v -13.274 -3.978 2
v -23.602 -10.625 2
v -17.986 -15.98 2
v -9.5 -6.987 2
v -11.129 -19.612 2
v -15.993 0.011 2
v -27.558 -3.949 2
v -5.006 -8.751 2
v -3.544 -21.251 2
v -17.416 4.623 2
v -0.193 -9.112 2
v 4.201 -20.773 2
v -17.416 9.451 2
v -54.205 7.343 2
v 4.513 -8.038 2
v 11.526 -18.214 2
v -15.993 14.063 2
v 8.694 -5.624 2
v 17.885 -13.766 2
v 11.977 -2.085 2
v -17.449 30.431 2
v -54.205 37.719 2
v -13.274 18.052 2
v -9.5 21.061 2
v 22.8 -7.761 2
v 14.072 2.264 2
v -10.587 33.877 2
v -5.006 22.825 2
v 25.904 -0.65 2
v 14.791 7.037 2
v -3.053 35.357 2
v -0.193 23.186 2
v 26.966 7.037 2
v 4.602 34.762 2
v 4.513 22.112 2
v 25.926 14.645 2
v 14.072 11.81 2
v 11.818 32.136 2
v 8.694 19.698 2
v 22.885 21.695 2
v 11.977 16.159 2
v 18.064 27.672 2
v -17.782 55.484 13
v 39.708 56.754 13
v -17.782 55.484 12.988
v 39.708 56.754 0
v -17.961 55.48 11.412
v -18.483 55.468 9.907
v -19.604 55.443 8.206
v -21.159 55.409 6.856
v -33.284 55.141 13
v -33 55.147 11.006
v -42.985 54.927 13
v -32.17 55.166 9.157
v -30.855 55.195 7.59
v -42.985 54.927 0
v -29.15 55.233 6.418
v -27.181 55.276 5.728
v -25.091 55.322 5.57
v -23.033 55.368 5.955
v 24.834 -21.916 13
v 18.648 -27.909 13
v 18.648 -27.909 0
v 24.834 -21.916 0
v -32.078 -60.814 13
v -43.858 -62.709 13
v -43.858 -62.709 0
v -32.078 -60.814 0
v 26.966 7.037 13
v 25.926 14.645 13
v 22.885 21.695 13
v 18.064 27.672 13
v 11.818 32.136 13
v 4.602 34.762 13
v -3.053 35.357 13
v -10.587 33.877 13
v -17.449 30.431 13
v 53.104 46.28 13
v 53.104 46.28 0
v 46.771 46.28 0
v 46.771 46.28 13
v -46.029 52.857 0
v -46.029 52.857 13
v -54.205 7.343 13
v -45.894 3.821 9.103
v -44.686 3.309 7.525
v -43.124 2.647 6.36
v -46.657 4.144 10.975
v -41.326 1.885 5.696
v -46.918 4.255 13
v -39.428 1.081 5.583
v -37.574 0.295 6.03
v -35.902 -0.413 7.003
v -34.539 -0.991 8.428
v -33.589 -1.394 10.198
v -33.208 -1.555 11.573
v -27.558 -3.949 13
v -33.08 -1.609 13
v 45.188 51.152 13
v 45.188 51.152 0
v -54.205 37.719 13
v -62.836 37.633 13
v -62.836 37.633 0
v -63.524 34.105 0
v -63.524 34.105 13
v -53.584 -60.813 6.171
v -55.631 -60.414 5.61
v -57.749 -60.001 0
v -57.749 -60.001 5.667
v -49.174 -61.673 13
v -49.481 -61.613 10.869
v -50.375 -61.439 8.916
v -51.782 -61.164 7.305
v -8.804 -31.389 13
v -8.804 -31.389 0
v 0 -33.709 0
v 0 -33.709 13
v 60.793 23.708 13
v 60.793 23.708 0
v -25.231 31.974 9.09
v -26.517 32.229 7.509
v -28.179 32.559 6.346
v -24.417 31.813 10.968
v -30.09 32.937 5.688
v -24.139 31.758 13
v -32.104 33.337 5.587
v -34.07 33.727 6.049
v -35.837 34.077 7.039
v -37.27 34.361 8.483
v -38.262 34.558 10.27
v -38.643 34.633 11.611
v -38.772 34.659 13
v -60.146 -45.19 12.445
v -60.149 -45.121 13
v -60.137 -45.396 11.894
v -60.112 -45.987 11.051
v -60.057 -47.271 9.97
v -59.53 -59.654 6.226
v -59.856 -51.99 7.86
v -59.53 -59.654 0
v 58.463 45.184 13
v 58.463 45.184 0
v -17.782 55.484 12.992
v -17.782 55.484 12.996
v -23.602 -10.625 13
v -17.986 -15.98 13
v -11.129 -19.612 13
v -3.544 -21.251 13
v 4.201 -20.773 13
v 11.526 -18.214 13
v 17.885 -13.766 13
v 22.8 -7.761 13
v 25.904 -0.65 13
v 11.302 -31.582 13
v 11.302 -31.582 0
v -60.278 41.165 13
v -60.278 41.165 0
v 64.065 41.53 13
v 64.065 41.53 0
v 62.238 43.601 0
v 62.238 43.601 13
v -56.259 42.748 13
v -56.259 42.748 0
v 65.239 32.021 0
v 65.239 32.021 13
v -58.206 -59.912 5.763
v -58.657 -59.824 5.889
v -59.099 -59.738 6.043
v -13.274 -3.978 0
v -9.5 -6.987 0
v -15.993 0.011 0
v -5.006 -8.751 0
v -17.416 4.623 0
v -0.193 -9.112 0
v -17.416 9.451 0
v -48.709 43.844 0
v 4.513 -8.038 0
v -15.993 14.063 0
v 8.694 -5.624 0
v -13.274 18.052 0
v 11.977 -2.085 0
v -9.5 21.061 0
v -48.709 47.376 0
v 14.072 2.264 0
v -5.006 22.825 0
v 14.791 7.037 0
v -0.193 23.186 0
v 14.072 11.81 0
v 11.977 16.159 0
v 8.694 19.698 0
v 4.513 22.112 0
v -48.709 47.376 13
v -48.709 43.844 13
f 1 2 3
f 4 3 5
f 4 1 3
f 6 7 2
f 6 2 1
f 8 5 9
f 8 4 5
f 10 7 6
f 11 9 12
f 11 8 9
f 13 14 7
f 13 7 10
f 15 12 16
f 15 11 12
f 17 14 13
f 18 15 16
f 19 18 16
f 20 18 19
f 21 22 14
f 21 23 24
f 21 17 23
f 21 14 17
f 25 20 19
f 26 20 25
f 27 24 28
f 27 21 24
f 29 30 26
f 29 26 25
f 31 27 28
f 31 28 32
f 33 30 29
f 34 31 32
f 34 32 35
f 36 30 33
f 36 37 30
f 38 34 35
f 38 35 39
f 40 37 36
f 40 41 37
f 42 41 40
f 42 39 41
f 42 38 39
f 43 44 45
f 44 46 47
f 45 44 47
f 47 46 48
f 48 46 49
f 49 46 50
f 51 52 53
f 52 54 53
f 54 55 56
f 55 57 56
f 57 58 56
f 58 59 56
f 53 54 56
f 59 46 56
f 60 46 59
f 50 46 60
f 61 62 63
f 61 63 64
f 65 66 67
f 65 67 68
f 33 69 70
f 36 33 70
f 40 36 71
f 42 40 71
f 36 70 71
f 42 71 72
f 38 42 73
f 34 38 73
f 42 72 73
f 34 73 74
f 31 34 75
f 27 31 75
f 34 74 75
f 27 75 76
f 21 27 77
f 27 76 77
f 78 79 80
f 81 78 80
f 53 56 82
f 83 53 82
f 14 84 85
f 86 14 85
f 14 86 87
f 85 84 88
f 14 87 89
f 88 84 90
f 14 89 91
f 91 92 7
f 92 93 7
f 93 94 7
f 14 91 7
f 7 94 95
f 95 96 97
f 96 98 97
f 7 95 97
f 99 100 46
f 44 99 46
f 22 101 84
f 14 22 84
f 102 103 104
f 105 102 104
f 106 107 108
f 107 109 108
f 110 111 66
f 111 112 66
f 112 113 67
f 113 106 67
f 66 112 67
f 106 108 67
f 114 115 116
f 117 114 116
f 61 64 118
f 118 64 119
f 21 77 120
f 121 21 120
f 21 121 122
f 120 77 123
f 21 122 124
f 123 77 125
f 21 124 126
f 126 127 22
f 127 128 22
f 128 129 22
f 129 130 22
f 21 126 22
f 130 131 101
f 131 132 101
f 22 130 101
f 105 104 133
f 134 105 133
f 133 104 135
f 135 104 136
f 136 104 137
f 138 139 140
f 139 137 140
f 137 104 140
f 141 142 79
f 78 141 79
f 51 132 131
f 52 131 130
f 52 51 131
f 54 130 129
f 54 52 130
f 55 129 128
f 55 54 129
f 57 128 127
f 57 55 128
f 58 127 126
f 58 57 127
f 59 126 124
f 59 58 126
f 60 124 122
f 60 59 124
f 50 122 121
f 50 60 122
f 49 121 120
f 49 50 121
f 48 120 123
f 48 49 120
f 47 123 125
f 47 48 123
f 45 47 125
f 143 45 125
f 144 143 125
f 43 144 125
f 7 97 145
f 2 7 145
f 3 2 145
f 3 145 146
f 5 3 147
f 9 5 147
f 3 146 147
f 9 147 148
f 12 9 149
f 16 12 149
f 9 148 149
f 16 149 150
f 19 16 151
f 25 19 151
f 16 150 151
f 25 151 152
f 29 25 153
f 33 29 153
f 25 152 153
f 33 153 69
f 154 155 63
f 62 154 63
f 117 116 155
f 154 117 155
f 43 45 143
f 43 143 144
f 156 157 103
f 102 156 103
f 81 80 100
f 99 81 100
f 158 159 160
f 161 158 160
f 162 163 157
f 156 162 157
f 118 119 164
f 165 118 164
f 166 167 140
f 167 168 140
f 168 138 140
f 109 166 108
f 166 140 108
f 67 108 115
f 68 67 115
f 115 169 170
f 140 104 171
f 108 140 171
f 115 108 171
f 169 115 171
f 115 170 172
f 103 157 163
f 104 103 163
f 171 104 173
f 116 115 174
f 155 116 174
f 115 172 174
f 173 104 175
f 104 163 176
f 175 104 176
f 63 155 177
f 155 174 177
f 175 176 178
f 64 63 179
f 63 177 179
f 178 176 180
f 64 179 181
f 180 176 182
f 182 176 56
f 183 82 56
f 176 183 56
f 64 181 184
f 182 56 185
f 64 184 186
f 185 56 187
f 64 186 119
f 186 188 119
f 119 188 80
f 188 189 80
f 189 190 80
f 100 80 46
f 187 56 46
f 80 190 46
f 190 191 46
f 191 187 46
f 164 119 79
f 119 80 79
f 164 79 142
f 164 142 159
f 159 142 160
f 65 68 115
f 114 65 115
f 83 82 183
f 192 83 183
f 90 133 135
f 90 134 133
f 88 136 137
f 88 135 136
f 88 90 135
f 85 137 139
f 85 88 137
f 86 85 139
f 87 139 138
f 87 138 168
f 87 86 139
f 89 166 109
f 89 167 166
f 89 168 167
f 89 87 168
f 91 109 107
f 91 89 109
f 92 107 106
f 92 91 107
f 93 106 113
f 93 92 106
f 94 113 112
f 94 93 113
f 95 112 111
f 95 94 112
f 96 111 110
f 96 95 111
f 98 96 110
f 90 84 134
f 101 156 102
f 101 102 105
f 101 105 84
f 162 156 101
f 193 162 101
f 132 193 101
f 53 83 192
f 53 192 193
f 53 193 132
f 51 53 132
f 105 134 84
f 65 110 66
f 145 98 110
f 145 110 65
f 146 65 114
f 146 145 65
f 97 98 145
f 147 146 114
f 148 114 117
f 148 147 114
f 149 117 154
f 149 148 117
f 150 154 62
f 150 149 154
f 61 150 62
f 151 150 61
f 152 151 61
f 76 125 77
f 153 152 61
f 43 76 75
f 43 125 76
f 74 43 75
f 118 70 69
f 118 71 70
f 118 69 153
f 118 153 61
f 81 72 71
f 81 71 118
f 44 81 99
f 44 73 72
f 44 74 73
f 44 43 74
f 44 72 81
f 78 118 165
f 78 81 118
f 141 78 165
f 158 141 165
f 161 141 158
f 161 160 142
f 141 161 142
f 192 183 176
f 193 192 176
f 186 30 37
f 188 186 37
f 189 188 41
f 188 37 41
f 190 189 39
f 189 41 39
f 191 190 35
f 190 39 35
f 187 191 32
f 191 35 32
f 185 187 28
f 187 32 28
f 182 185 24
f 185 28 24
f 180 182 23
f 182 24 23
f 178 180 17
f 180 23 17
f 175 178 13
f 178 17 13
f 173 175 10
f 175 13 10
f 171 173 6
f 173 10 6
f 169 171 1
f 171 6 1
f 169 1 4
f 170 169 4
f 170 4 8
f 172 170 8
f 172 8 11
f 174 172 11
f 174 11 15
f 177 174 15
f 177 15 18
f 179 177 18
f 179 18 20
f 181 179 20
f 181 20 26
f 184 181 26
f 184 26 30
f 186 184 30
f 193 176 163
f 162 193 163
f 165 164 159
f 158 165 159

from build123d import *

# Parameters (mm, degrees)
F1_DEPTH  = 13
F2_R      = 16.193977
F3_DEPTH  = 13
F4_DEPTH  = 11
F9_R      = 7.442365
F10_DEPTH = 126.005636


with BuildPart() as f1:
    # F0 (on Top) → F1 (new body)
    with BuildSketch(Plane.XY):
        Polygon((-32.077711, -60.813792), (-8.803713, -31.388912), (0, -33.708788), (11.301869, -31.58224), (18.64814, -27.909102), (24.834473, -21.916091), (60.792536, 23.708114), (65.238968, 32.021001), (64.06498, 41.530453), (62.238194, 43.600813), (58.462832, 45.184027), (53.104255, 46.280101), (46.771396, 46.280101), (45.188177, 51.151533), (39.707817, 56.75368), (-42.984739, 54.926891), (-46.029385, 52.856531), (-48.708674, 47.376171), (-48.708674, 43.844383), (-56.259394, 42.74831), (-60.278326, 41.165095), (-62.835827, 37.633304), (-63.523754, 34.105126), (-59.529565, -59.653856), (-57.749115, -60.001009), (-43.858236, -62.709465), align=None)
    extrude(amount=F1_DEPTH)

    # F2 (on face) → F3 (cut, through all)
    with BuildSketch(Plane.XY.offset(13)):
        with Locations((-1.402867, 7.036958)):
            Circle(F2_R)
    extrude(amount=-F3_DEPTH, mode=Mode.SUBTRACT)

    # F2 (on face) → F4 (cut)
    with BuildSketch(Plane.XY.offset(13)):
        with BuildLine():
            ThreePointArc((-27.557551, -3.949325), (4.20068, -20.772503), (26.965529, 7.036958))
            ThreePointArc((26.965529, 7.036958), (11.817696, 32.136413), (-17.448869, 30.431225))
            ThreePointArc((-17.448869, 30.431225), (-28.619223, 15.0392), (-27.557551, -3.949325))
        make_face()
        with Locations((-1.402867, 7.036958)):
            Circle(F2_R, mode=Mode.SUBTRACT)
        with BuildLine():
            ThreePointArc((-27.557551, -3.949325), (-28.619223, 15.0392), (-17.448869, 30.431225))
            Line((-17.448869, 30.431225), (-54.205403, 37.718657))
            Line((-54.205403, 37.718657), (-54.205403, 7.342626))
            Line((-54.205403, 7.342626), (-27.557551, -3.949325))
        make_face()
    extrude(amount=-F4_DEPTH, mode=Mode.SUBTRACT)

    # F9 (on face) → F10 (cut, through all)
    with BuildSketch(Plane(origin=(12.679749, 47.321467, 0), x_dir=(0.965926, -0.258819, 0), z_dir=(-0.258819, -0.965926, 0))):
        with Locations((-38.978635, 13)):
            Circle(F9_R)
    extrude(amount=F10_DEPTH, mode=Mode.SUBTRACT)


solid = f1.part
